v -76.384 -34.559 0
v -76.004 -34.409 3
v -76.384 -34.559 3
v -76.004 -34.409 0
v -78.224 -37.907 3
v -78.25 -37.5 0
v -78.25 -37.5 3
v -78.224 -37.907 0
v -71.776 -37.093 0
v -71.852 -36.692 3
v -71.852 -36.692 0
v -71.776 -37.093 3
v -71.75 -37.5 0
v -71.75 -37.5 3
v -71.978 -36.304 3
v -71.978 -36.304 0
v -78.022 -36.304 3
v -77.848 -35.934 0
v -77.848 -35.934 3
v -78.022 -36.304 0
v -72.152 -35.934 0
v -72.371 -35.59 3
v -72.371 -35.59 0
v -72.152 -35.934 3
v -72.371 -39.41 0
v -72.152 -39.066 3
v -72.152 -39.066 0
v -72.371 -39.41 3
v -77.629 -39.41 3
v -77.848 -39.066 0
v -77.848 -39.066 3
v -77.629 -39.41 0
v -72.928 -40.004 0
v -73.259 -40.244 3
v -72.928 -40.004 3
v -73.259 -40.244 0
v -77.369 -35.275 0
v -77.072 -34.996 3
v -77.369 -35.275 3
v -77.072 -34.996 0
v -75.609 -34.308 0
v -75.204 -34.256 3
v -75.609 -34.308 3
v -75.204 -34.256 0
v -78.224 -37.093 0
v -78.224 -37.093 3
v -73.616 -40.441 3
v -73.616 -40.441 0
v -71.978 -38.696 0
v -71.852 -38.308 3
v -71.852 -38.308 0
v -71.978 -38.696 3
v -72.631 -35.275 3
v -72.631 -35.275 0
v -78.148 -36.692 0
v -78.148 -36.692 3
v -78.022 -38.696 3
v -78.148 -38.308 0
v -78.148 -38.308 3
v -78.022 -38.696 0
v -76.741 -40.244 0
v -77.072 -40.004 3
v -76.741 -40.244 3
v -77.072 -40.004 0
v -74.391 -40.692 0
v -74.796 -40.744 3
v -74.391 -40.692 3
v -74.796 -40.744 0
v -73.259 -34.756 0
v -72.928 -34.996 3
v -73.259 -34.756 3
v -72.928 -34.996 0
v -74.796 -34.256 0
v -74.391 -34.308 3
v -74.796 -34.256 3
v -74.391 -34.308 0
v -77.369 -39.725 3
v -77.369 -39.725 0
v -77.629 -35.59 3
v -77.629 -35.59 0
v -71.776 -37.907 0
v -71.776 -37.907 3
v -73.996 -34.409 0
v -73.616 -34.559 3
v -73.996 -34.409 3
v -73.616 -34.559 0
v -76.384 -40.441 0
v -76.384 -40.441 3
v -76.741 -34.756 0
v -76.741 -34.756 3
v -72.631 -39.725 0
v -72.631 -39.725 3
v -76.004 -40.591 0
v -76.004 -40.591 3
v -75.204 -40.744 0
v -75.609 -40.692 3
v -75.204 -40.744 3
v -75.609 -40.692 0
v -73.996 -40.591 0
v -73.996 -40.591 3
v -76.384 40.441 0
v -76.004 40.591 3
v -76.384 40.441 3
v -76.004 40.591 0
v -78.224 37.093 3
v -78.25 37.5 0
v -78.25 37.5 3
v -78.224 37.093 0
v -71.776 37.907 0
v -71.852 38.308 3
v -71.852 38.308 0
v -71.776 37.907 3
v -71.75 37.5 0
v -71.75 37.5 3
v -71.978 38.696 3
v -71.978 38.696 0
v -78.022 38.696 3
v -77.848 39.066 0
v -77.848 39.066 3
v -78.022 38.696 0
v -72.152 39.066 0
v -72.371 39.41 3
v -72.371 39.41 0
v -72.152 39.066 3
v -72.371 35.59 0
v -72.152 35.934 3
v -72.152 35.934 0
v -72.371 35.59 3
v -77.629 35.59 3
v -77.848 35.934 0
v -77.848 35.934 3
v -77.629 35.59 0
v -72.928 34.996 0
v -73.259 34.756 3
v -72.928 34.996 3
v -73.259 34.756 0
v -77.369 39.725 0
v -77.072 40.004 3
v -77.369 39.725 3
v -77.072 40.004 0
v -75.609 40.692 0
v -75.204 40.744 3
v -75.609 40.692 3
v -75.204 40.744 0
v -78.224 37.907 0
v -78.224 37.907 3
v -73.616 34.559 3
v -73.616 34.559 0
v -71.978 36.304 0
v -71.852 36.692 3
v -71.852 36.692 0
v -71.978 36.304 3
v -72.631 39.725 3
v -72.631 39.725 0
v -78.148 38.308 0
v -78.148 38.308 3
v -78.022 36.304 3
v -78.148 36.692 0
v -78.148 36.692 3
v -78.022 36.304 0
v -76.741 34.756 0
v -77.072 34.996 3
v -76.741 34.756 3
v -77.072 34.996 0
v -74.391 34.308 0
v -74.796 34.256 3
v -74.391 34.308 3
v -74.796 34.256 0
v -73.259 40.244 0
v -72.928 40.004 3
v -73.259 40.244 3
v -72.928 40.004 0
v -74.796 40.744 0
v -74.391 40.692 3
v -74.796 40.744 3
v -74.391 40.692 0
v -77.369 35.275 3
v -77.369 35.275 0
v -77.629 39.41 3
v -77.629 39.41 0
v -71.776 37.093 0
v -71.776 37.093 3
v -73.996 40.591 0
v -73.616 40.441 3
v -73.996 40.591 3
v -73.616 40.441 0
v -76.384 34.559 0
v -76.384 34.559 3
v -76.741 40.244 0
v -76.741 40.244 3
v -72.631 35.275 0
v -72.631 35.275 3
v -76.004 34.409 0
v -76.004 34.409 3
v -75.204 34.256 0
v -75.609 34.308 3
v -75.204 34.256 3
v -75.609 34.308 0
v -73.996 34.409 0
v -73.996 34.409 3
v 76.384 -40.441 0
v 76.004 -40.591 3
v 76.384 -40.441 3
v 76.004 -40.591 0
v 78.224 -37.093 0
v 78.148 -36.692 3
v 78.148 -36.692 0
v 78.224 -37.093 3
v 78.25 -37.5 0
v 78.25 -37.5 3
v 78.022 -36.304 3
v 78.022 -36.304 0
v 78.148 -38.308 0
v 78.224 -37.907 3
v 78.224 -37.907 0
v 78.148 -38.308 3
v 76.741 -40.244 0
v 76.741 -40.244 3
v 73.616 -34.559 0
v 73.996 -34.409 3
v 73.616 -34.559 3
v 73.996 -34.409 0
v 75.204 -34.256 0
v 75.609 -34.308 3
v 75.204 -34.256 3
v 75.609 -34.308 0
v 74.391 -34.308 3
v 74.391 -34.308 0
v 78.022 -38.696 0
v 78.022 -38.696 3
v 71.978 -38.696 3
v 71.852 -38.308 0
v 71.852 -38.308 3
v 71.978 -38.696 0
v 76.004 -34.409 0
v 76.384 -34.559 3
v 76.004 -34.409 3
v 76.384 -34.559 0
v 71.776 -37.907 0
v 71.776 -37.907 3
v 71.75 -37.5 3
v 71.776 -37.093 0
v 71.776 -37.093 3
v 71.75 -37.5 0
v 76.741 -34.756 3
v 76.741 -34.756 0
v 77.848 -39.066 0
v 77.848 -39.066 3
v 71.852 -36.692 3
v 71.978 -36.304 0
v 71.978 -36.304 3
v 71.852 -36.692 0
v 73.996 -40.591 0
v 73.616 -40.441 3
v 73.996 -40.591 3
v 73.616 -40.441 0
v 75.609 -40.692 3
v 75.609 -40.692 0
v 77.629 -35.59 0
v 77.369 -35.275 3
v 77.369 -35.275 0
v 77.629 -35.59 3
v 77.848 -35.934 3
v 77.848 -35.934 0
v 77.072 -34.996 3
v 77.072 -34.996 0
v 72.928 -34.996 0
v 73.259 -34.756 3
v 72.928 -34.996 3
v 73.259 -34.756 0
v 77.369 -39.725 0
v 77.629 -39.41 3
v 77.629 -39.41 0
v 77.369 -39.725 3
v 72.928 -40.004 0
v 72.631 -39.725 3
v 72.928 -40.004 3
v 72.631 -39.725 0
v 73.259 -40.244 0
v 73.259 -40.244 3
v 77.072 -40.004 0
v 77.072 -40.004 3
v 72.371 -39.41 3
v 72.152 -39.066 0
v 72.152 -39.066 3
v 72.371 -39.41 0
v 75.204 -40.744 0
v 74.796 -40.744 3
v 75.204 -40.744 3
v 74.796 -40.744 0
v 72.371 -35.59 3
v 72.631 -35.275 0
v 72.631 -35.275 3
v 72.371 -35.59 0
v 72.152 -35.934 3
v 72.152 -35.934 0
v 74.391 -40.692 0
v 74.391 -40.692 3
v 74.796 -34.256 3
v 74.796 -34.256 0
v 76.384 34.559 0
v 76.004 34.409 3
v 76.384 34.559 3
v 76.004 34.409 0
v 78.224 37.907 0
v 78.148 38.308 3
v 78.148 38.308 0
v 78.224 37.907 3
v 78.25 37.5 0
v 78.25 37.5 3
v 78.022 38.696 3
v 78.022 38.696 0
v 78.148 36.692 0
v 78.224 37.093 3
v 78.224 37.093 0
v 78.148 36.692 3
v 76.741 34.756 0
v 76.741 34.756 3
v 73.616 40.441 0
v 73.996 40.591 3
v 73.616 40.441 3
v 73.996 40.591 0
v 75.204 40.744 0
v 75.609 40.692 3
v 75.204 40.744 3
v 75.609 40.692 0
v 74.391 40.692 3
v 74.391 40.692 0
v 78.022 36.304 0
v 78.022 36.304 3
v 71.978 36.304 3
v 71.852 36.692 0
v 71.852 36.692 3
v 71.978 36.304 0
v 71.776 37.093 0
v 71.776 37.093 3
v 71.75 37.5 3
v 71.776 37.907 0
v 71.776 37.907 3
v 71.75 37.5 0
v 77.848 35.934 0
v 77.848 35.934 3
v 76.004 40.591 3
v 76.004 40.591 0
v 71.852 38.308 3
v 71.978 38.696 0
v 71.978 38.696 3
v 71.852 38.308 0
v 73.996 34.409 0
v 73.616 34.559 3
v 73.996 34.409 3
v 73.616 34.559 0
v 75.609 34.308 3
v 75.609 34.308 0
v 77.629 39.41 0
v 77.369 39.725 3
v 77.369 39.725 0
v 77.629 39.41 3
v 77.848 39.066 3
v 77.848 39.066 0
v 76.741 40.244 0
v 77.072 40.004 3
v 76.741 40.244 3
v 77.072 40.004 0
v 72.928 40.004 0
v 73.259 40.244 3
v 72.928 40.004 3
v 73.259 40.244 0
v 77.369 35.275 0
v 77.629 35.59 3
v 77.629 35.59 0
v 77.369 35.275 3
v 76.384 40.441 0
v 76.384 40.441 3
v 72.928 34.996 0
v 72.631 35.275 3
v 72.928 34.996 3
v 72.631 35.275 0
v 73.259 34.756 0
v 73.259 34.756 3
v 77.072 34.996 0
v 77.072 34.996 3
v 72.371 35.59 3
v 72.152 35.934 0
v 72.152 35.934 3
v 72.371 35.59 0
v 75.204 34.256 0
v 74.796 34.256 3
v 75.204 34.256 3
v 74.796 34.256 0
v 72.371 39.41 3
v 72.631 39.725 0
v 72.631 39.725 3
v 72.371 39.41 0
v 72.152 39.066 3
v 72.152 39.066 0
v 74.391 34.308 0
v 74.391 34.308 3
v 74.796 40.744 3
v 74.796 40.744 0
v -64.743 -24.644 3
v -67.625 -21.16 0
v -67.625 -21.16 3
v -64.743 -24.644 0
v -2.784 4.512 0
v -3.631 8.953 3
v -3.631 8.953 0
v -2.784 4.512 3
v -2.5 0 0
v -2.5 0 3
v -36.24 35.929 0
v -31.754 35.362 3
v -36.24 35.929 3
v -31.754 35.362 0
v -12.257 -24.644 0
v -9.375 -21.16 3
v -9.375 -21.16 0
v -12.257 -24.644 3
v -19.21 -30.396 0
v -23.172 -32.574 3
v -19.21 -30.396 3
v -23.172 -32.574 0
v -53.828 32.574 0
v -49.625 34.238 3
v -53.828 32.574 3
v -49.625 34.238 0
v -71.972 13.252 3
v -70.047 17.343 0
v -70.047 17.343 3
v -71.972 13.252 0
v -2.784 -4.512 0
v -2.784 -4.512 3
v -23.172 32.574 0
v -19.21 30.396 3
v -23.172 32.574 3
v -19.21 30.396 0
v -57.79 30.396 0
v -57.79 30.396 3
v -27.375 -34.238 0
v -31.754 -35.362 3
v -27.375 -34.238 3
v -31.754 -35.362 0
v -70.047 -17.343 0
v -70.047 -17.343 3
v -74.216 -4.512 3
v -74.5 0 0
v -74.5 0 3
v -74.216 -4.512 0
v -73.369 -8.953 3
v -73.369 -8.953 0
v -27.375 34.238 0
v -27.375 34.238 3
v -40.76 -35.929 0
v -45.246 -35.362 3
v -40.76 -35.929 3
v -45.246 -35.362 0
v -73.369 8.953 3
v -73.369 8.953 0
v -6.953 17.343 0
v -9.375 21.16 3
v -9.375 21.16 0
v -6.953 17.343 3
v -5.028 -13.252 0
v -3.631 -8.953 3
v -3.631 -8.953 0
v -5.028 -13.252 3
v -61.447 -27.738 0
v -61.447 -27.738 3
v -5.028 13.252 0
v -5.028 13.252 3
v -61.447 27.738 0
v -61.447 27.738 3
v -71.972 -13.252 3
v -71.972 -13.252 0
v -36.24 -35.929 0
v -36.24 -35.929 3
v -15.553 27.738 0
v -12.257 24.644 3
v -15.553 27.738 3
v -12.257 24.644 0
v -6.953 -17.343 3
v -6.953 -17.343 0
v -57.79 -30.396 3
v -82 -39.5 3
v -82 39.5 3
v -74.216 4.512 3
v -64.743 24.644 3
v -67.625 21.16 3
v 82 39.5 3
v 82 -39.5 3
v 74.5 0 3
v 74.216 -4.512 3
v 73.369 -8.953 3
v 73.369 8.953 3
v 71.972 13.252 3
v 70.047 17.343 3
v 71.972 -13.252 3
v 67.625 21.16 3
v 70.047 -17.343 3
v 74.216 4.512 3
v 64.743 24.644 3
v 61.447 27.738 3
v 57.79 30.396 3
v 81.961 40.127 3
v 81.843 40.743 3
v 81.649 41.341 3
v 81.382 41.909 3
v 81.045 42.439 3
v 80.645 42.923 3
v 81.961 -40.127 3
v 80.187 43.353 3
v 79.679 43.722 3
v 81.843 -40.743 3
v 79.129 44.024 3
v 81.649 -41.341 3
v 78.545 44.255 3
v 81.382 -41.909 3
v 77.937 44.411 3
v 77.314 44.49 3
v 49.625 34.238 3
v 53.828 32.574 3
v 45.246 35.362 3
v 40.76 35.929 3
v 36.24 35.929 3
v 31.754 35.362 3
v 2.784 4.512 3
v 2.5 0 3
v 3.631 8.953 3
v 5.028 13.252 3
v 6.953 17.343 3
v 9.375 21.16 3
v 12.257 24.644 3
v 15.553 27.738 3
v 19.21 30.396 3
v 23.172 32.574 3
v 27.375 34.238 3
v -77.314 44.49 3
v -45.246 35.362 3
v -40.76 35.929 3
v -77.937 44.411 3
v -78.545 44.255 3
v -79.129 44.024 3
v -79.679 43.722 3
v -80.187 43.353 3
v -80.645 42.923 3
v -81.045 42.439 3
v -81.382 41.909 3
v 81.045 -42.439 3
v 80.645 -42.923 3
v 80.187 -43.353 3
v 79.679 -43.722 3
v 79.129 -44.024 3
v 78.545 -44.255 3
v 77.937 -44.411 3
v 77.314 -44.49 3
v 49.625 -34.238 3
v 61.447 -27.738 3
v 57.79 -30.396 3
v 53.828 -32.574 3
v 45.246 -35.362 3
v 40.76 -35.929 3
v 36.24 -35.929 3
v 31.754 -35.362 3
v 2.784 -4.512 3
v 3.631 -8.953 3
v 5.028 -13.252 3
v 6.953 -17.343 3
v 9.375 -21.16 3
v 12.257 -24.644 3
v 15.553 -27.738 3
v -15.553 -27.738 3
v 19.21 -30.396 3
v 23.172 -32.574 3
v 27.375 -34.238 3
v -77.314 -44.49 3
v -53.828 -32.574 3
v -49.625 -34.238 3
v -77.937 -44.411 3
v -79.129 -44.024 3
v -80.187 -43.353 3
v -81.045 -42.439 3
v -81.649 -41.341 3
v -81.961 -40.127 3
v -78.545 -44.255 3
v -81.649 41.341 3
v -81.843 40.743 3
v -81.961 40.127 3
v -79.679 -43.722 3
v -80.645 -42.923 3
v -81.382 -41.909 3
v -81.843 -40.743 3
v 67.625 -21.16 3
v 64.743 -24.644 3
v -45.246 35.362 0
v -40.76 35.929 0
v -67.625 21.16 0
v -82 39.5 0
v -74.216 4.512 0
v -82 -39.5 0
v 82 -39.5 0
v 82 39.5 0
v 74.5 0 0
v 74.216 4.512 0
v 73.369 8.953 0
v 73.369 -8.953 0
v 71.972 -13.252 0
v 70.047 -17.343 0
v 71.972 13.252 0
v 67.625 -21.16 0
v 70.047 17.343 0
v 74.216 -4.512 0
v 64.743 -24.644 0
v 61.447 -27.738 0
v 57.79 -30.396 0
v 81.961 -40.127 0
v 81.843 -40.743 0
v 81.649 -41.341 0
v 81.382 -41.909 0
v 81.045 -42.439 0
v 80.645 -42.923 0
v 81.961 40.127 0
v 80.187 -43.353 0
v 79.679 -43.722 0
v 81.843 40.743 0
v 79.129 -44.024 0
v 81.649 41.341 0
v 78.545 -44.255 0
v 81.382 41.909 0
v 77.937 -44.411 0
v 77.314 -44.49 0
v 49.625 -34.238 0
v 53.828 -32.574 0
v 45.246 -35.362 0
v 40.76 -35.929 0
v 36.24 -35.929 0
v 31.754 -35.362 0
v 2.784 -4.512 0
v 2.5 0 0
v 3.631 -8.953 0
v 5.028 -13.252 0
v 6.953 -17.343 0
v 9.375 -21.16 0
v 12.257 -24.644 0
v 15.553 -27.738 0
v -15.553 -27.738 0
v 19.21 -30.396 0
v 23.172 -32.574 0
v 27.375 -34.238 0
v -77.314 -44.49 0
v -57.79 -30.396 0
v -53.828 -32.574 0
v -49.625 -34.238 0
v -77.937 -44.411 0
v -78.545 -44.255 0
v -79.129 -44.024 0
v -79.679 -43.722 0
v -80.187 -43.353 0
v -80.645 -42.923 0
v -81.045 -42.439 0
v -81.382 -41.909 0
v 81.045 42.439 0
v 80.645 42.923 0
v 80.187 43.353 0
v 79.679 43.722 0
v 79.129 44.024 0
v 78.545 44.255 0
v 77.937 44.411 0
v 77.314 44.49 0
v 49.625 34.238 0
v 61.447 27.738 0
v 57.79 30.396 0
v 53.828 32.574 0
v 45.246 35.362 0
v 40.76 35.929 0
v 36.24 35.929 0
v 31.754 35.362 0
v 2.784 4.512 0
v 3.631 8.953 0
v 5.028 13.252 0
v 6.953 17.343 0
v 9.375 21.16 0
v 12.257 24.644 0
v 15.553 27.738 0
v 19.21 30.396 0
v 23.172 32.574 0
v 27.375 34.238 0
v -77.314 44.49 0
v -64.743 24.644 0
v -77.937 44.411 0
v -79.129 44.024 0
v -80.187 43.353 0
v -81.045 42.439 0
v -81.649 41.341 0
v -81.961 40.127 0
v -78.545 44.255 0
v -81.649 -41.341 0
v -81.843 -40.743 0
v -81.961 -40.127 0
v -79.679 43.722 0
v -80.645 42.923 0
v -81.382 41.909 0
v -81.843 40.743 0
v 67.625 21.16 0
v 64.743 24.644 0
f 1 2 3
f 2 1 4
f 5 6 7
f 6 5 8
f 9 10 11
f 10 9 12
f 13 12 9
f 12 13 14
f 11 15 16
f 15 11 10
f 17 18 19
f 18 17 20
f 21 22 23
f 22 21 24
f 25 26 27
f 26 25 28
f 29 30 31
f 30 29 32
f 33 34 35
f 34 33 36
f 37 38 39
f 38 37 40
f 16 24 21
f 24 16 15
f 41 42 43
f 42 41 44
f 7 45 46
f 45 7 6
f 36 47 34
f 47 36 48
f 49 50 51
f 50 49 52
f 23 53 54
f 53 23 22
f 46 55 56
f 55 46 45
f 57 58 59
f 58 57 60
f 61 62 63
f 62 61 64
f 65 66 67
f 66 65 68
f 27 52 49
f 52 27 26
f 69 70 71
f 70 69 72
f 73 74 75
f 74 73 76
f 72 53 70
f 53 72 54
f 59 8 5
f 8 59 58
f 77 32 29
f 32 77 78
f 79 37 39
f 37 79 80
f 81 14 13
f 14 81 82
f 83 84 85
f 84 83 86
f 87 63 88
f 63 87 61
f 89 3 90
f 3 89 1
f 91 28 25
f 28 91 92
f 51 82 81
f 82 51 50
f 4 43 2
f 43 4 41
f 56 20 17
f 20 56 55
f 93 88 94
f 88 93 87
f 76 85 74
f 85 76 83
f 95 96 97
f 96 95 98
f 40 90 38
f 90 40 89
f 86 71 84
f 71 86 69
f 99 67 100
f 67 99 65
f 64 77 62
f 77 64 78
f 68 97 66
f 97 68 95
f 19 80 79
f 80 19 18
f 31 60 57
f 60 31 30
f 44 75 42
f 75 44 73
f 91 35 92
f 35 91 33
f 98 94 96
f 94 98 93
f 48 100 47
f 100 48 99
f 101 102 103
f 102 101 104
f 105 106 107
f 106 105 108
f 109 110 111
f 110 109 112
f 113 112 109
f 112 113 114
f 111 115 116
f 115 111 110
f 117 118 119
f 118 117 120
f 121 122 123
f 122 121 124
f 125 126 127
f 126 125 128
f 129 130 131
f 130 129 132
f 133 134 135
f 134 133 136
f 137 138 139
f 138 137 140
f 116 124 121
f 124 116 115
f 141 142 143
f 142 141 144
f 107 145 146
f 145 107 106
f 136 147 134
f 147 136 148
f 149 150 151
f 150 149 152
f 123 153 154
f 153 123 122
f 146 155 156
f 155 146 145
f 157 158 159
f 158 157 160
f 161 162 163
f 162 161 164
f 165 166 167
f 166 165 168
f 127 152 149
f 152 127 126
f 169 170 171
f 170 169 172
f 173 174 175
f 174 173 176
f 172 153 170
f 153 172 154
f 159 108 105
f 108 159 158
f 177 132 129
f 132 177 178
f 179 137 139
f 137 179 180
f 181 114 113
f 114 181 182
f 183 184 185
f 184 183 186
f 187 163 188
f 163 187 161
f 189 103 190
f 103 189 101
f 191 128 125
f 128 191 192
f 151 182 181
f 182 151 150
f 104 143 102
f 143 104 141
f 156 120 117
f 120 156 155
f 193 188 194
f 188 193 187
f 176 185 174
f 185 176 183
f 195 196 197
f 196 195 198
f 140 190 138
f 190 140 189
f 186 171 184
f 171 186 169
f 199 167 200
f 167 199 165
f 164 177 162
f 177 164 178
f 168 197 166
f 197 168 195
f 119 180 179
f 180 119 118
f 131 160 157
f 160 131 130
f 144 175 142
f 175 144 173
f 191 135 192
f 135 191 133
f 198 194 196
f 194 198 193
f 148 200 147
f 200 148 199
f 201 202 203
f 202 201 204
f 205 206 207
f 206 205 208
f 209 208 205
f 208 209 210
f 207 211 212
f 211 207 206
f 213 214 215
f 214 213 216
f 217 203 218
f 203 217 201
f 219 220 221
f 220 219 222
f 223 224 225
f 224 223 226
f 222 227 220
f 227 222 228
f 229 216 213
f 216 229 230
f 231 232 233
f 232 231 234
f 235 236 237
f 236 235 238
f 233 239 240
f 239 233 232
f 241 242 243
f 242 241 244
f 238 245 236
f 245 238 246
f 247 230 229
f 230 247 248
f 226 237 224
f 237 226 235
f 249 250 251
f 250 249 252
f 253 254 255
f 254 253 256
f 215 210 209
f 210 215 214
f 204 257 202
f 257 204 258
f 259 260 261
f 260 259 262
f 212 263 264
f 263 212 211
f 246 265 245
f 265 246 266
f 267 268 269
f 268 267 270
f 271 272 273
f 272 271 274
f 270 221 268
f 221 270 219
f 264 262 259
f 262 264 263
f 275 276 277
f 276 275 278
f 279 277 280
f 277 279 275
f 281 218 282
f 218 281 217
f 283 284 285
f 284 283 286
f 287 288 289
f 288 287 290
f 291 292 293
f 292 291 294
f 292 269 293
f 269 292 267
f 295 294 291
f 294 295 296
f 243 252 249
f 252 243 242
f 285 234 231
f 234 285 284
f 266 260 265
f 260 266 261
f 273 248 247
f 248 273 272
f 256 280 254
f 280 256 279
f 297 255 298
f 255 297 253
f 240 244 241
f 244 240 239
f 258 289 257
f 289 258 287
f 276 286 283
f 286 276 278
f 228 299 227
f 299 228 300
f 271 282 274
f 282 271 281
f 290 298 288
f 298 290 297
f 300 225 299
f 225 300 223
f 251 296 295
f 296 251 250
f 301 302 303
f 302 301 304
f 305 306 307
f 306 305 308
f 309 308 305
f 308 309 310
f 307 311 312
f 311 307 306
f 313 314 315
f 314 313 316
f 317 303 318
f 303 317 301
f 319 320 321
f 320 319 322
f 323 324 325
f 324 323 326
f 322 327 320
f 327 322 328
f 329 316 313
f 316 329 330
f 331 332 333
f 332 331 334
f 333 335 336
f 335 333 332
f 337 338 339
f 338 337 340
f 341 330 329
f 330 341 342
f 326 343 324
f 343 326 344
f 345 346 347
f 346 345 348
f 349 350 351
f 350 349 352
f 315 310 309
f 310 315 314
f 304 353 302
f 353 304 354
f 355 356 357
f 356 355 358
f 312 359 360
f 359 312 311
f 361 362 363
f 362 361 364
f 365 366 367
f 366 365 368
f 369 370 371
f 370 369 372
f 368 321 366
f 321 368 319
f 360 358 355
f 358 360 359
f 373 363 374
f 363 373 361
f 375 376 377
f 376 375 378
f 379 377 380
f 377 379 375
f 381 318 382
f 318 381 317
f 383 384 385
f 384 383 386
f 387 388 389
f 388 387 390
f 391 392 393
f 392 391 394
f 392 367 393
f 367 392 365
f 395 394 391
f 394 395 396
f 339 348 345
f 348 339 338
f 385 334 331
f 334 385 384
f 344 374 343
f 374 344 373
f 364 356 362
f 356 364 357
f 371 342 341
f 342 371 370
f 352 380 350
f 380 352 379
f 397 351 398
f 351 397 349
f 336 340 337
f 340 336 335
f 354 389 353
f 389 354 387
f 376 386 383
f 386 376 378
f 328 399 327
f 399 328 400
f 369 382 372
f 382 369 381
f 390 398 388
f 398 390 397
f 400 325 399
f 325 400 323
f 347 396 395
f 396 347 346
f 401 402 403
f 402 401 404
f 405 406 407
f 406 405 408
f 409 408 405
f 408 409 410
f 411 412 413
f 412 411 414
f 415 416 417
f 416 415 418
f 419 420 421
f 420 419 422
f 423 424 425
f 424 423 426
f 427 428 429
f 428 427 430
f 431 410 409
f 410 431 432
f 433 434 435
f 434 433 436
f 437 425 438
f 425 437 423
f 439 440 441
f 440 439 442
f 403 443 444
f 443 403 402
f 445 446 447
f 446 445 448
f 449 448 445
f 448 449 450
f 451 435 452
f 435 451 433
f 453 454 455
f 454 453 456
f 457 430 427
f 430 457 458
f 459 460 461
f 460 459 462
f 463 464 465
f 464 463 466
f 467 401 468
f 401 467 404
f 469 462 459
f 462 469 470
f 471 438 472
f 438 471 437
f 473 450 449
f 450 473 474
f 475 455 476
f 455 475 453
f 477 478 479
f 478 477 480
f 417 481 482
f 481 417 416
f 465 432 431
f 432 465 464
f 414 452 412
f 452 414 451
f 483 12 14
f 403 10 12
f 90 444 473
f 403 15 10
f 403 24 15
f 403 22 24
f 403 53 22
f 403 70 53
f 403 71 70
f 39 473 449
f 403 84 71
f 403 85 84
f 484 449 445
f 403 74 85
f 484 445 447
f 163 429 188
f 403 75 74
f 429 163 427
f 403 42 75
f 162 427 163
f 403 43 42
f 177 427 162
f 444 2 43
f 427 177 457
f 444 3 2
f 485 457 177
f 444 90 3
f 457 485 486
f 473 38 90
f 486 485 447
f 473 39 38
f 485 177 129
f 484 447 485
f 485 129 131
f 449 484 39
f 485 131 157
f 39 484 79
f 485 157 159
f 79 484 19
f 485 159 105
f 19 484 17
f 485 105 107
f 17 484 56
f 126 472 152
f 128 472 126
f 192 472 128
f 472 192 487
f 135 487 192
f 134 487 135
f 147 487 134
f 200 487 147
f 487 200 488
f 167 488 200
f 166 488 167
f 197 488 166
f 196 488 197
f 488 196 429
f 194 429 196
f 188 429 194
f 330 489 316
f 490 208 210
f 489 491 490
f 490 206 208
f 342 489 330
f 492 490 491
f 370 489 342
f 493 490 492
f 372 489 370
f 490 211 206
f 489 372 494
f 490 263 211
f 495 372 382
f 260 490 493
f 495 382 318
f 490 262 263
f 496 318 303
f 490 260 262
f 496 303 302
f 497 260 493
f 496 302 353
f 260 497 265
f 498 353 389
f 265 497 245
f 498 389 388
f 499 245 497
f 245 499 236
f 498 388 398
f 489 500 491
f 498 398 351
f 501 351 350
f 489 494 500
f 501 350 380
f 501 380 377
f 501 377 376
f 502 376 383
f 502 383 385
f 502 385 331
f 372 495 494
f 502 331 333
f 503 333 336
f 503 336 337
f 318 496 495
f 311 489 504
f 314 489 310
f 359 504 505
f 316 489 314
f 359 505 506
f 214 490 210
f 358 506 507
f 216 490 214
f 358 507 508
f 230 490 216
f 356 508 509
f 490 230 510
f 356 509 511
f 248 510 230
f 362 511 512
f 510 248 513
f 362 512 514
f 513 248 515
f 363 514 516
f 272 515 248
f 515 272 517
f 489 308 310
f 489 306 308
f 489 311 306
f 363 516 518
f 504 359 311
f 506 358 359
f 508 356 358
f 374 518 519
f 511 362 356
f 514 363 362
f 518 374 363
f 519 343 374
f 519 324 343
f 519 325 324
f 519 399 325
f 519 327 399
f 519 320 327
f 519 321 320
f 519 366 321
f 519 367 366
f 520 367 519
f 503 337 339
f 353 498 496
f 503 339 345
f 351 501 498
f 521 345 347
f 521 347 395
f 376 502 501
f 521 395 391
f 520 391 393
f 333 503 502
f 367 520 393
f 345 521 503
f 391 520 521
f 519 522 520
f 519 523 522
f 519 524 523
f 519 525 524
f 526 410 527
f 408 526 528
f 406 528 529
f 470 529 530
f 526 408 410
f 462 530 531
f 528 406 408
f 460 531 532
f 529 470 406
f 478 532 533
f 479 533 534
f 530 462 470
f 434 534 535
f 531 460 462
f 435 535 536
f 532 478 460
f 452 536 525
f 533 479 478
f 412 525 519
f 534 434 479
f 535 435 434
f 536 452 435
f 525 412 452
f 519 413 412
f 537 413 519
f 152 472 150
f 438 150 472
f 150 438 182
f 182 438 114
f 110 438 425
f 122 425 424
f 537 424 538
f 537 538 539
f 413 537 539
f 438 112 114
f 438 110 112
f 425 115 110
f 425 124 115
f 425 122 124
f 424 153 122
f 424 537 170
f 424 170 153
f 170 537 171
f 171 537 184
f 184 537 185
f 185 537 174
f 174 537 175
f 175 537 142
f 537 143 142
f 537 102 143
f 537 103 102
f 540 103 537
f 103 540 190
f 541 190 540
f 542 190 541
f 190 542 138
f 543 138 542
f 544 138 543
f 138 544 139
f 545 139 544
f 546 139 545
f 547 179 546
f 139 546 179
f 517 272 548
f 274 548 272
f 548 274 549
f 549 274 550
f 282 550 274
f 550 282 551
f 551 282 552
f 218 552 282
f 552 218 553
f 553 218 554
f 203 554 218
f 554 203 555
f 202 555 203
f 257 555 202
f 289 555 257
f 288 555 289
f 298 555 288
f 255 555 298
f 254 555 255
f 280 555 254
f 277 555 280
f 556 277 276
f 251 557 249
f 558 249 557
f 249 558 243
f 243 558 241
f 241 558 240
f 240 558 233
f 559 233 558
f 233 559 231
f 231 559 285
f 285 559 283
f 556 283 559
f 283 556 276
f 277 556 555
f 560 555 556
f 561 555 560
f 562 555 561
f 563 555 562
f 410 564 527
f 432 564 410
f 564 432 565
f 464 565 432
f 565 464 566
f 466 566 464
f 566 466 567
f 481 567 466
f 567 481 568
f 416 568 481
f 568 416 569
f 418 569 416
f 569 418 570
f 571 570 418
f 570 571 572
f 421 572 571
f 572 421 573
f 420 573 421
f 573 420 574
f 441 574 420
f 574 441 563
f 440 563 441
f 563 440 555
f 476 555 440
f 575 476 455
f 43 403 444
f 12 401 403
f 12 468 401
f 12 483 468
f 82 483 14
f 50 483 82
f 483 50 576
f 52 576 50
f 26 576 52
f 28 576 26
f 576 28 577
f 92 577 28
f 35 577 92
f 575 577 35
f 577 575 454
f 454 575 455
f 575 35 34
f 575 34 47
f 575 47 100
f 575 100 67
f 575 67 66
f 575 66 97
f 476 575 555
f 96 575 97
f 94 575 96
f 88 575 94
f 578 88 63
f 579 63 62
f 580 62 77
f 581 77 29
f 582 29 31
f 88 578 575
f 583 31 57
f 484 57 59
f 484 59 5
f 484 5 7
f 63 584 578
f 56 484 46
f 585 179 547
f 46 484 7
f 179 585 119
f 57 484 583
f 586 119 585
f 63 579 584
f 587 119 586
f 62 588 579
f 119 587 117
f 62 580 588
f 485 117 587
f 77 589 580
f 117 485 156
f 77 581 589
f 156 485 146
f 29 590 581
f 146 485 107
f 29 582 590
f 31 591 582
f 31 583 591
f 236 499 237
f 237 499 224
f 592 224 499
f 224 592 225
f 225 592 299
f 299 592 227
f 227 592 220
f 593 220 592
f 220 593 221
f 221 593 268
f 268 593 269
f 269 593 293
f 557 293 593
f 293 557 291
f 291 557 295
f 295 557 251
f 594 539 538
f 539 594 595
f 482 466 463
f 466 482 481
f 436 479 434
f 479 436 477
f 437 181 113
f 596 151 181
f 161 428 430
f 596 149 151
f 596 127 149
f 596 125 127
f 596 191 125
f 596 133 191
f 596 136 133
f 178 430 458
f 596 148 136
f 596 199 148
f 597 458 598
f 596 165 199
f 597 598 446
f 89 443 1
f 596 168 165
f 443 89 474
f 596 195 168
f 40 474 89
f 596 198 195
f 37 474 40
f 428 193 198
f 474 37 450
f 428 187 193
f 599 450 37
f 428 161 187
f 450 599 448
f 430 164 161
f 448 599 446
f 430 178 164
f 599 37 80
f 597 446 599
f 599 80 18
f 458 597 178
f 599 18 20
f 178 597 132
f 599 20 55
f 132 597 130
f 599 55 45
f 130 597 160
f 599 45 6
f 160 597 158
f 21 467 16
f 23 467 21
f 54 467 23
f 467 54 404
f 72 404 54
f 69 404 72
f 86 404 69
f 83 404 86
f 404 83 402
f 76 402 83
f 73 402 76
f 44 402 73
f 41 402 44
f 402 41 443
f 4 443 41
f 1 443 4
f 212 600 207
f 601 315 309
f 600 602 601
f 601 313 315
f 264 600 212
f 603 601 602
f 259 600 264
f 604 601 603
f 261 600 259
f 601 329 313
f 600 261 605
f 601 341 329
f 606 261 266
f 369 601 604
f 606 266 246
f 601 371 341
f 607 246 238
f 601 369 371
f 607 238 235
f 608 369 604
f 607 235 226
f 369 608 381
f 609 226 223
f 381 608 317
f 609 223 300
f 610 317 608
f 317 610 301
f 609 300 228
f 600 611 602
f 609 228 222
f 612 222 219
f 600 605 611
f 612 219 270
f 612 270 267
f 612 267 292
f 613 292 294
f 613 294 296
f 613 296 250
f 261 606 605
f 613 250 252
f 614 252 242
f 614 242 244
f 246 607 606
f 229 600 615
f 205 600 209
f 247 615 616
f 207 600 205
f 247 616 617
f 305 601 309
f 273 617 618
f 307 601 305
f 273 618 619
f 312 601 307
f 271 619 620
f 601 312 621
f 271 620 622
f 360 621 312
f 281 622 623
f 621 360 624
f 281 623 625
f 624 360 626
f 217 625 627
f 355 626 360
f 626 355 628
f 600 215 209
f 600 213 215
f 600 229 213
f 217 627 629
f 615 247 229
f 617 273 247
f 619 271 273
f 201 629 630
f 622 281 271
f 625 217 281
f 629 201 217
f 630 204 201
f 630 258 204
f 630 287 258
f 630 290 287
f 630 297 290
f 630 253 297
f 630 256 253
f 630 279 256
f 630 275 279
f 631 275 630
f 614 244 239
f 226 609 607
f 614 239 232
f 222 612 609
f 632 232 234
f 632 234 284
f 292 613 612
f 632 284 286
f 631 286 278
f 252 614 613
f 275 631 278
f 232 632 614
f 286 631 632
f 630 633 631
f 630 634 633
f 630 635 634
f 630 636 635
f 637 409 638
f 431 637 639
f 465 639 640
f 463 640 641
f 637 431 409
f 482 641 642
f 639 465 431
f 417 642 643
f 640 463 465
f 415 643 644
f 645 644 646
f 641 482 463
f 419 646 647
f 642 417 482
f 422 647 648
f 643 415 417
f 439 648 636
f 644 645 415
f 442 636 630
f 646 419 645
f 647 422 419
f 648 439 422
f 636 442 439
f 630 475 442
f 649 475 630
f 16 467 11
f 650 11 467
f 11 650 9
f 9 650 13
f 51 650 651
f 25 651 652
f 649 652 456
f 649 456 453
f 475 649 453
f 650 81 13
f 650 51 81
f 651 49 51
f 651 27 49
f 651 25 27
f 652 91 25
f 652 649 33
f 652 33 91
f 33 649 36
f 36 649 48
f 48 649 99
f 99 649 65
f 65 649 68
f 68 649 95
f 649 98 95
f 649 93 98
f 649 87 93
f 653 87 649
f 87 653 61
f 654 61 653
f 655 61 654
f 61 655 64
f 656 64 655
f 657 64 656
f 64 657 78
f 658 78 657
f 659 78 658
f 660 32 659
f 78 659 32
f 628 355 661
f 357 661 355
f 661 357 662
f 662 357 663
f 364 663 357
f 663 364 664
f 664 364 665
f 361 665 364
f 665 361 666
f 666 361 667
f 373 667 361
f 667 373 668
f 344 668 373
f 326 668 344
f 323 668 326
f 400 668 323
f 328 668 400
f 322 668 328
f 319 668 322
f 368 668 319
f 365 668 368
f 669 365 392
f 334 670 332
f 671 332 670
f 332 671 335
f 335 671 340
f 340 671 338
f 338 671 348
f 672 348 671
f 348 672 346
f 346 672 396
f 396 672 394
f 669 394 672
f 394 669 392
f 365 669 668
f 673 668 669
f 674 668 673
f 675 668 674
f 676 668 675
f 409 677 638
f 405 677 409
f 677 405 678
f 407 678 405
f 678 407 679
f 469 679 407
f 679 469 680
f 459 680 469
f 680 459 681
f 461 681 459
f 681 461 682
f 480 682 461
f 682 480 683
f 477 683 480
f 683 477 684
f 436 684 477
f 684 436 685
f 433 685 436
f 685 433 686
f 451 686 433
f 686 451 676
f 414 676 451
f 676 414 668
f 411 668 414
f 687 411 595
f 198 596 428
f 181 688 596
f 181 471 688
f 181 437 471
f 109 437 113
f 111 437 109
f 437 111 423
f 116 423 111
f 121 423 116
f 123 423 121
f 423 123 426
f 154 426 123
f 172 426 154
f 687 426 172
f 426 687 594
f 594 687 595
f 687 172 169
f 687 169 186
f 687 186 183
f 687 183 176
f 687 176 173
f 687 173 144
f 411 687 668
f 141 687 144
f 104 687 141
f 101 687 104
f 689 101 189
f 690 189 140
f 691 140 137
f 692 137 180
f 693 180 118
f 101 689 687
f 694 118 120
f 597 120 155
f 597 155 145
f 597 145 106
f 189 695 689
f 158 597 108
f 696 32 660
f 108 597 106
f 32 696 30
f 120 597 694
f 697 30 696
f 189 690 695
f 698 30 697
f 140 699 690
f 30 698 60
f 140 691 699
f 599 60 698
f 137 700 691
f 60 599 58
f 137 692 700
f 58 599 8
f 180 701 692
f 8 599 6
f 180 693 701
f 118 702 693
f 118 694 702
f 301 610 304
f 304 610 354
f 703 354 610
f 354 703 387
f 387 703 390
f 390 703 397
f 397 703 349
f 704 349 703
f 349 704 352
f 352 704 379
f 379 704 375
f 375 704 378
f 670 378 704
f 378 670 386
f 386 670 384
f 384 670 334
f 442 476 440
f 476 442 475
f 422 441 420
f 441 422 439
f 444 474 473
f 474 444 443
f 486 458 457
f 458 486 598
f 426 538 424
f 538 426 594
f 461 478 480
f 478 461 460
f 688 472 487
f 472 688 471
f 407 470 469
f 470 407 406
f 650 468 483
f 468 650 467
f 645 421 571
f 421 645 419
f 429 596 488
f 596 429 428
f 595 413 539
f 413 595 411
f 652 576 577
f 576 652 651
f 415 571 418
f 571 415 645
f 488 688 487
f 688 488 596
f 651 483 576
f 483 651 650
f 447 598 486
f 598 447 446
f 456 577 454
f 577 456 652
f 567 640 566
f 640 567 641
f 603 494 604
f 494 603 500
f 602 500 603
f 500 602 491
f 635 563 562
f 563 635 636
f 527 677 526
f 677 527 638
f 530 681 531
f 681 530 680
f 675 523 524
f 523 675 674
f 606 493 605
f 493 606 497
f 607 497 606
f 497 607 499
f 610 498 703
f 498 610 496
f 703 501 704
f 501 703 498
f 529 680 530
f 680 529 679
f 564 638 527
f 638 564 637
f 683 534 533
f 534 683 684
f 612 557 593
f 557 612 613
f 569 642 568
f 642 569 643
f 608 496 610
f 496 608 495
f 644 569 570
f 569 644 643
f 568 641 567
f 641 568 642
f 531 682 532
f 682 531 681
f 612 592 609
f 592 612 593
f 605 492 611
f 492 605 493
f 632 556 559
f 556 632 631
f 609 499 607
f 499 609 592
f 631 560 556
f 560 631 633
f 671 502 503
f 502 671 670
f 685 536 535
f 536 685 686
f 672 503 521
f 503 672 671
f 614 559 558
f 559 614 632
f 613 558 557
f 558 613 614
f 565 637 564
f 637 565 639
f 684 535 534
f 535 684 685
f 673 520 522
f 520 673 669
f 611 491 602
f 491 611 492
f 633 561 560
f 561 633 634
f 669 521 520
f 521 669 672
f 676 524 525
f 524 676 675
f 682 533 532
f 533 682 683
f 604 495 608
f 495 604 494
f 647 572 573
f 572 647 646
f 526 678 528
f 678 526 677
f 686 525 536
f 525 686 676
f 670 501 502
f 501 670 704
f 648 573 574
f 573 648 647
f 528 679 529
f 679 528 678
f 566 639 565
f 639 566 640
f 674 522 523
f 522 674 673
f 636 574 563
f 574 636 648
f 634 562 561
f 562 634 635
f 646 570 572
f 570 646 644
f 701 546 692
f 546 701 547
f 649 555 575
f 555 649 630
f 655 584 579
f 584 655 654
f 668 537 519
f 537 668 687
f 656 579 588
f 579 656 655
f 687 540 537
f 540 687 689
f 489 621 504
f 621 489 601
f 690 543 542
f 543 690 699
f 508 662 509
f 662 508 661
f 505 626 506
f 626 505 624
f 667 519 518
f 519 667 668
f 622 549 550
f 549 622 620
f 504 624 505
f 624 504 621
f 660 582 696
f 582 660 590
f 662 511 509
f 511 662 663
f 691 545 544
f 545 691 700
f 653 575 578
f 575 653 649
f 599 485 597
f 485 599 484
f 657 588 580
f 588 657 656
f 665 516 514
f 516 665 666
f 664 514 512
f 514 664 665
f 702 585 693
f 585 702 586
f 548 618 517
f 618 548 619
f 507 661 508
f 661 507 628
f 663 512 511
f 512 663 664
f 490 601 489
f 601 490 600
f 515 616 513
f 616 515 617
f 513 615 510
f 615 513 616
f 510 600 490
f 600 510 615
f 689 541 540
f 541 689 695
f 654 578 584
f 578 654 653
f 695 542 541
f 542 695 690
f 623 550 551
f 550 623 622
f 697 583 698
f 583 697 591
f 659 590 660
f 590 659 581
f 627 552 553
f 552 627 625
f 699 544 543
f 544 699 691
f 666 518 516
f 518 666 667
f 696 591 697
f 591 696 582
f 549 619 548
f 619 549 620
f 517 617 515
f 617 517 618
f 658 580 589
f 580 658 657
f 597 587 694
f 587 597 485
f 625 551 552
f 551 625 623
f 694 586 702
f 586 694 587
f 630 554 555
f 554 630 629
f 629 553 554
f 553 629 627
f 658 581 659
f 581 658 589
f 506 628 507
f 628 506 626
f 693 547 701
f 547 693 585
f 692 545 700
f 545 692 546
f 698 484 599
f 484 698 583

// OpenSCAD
$fn = 50;


difference() {
	union() {
		hull() {
			translate(v = [-77.0000000000, 39.5000000000, 0]) {
				cylinder(h = 3, r = 5);
			}
			translate(v = [77.0000000000, 39.5000000000, 0]) {
				cylinder(h = 3, r = 5);
			}
			translate(v = [-77.0000000000, -39.5000000000, 0]) {
				cylinder(h = 3, r = 5);
			}
			translate(v = [77.0000000000, -39.5000000000, 0]) {
				cylinder(h = 3, r = 5);
			}
		}
	}
	union() {
		#translate(v = [-75.0000000000, -37.5000000000, -100.0000000000]) {
			cylinder(h = 200, r = 3.2500000000);
		}
		#translate(v = [-75.0000000000, 37.5000000000, -100.0000000000]) {
			cylinder(h = 200, r = 3.2500000000);
		}
		#translate(v = [75.0000000000, -37.5000000000, -100.0000000000]) {
			cylinder(h = 200, r = 3.2500000000);
		}
		#translate(v = [75.0000000000, 37.5000000000, -100.0000000000]) {
			cylinder(h = 200, r = 3.2500000000);
		}
		#translate(v = [-38.5000000000, 0, 0]) {
			cylinder(h = 3, r = 36.0000000000);
		}
		#translate(v = [38.5000000000, 0, 0]) {
			cylinder(h = 3, r = 36.0000000000);
		}
	}
}
